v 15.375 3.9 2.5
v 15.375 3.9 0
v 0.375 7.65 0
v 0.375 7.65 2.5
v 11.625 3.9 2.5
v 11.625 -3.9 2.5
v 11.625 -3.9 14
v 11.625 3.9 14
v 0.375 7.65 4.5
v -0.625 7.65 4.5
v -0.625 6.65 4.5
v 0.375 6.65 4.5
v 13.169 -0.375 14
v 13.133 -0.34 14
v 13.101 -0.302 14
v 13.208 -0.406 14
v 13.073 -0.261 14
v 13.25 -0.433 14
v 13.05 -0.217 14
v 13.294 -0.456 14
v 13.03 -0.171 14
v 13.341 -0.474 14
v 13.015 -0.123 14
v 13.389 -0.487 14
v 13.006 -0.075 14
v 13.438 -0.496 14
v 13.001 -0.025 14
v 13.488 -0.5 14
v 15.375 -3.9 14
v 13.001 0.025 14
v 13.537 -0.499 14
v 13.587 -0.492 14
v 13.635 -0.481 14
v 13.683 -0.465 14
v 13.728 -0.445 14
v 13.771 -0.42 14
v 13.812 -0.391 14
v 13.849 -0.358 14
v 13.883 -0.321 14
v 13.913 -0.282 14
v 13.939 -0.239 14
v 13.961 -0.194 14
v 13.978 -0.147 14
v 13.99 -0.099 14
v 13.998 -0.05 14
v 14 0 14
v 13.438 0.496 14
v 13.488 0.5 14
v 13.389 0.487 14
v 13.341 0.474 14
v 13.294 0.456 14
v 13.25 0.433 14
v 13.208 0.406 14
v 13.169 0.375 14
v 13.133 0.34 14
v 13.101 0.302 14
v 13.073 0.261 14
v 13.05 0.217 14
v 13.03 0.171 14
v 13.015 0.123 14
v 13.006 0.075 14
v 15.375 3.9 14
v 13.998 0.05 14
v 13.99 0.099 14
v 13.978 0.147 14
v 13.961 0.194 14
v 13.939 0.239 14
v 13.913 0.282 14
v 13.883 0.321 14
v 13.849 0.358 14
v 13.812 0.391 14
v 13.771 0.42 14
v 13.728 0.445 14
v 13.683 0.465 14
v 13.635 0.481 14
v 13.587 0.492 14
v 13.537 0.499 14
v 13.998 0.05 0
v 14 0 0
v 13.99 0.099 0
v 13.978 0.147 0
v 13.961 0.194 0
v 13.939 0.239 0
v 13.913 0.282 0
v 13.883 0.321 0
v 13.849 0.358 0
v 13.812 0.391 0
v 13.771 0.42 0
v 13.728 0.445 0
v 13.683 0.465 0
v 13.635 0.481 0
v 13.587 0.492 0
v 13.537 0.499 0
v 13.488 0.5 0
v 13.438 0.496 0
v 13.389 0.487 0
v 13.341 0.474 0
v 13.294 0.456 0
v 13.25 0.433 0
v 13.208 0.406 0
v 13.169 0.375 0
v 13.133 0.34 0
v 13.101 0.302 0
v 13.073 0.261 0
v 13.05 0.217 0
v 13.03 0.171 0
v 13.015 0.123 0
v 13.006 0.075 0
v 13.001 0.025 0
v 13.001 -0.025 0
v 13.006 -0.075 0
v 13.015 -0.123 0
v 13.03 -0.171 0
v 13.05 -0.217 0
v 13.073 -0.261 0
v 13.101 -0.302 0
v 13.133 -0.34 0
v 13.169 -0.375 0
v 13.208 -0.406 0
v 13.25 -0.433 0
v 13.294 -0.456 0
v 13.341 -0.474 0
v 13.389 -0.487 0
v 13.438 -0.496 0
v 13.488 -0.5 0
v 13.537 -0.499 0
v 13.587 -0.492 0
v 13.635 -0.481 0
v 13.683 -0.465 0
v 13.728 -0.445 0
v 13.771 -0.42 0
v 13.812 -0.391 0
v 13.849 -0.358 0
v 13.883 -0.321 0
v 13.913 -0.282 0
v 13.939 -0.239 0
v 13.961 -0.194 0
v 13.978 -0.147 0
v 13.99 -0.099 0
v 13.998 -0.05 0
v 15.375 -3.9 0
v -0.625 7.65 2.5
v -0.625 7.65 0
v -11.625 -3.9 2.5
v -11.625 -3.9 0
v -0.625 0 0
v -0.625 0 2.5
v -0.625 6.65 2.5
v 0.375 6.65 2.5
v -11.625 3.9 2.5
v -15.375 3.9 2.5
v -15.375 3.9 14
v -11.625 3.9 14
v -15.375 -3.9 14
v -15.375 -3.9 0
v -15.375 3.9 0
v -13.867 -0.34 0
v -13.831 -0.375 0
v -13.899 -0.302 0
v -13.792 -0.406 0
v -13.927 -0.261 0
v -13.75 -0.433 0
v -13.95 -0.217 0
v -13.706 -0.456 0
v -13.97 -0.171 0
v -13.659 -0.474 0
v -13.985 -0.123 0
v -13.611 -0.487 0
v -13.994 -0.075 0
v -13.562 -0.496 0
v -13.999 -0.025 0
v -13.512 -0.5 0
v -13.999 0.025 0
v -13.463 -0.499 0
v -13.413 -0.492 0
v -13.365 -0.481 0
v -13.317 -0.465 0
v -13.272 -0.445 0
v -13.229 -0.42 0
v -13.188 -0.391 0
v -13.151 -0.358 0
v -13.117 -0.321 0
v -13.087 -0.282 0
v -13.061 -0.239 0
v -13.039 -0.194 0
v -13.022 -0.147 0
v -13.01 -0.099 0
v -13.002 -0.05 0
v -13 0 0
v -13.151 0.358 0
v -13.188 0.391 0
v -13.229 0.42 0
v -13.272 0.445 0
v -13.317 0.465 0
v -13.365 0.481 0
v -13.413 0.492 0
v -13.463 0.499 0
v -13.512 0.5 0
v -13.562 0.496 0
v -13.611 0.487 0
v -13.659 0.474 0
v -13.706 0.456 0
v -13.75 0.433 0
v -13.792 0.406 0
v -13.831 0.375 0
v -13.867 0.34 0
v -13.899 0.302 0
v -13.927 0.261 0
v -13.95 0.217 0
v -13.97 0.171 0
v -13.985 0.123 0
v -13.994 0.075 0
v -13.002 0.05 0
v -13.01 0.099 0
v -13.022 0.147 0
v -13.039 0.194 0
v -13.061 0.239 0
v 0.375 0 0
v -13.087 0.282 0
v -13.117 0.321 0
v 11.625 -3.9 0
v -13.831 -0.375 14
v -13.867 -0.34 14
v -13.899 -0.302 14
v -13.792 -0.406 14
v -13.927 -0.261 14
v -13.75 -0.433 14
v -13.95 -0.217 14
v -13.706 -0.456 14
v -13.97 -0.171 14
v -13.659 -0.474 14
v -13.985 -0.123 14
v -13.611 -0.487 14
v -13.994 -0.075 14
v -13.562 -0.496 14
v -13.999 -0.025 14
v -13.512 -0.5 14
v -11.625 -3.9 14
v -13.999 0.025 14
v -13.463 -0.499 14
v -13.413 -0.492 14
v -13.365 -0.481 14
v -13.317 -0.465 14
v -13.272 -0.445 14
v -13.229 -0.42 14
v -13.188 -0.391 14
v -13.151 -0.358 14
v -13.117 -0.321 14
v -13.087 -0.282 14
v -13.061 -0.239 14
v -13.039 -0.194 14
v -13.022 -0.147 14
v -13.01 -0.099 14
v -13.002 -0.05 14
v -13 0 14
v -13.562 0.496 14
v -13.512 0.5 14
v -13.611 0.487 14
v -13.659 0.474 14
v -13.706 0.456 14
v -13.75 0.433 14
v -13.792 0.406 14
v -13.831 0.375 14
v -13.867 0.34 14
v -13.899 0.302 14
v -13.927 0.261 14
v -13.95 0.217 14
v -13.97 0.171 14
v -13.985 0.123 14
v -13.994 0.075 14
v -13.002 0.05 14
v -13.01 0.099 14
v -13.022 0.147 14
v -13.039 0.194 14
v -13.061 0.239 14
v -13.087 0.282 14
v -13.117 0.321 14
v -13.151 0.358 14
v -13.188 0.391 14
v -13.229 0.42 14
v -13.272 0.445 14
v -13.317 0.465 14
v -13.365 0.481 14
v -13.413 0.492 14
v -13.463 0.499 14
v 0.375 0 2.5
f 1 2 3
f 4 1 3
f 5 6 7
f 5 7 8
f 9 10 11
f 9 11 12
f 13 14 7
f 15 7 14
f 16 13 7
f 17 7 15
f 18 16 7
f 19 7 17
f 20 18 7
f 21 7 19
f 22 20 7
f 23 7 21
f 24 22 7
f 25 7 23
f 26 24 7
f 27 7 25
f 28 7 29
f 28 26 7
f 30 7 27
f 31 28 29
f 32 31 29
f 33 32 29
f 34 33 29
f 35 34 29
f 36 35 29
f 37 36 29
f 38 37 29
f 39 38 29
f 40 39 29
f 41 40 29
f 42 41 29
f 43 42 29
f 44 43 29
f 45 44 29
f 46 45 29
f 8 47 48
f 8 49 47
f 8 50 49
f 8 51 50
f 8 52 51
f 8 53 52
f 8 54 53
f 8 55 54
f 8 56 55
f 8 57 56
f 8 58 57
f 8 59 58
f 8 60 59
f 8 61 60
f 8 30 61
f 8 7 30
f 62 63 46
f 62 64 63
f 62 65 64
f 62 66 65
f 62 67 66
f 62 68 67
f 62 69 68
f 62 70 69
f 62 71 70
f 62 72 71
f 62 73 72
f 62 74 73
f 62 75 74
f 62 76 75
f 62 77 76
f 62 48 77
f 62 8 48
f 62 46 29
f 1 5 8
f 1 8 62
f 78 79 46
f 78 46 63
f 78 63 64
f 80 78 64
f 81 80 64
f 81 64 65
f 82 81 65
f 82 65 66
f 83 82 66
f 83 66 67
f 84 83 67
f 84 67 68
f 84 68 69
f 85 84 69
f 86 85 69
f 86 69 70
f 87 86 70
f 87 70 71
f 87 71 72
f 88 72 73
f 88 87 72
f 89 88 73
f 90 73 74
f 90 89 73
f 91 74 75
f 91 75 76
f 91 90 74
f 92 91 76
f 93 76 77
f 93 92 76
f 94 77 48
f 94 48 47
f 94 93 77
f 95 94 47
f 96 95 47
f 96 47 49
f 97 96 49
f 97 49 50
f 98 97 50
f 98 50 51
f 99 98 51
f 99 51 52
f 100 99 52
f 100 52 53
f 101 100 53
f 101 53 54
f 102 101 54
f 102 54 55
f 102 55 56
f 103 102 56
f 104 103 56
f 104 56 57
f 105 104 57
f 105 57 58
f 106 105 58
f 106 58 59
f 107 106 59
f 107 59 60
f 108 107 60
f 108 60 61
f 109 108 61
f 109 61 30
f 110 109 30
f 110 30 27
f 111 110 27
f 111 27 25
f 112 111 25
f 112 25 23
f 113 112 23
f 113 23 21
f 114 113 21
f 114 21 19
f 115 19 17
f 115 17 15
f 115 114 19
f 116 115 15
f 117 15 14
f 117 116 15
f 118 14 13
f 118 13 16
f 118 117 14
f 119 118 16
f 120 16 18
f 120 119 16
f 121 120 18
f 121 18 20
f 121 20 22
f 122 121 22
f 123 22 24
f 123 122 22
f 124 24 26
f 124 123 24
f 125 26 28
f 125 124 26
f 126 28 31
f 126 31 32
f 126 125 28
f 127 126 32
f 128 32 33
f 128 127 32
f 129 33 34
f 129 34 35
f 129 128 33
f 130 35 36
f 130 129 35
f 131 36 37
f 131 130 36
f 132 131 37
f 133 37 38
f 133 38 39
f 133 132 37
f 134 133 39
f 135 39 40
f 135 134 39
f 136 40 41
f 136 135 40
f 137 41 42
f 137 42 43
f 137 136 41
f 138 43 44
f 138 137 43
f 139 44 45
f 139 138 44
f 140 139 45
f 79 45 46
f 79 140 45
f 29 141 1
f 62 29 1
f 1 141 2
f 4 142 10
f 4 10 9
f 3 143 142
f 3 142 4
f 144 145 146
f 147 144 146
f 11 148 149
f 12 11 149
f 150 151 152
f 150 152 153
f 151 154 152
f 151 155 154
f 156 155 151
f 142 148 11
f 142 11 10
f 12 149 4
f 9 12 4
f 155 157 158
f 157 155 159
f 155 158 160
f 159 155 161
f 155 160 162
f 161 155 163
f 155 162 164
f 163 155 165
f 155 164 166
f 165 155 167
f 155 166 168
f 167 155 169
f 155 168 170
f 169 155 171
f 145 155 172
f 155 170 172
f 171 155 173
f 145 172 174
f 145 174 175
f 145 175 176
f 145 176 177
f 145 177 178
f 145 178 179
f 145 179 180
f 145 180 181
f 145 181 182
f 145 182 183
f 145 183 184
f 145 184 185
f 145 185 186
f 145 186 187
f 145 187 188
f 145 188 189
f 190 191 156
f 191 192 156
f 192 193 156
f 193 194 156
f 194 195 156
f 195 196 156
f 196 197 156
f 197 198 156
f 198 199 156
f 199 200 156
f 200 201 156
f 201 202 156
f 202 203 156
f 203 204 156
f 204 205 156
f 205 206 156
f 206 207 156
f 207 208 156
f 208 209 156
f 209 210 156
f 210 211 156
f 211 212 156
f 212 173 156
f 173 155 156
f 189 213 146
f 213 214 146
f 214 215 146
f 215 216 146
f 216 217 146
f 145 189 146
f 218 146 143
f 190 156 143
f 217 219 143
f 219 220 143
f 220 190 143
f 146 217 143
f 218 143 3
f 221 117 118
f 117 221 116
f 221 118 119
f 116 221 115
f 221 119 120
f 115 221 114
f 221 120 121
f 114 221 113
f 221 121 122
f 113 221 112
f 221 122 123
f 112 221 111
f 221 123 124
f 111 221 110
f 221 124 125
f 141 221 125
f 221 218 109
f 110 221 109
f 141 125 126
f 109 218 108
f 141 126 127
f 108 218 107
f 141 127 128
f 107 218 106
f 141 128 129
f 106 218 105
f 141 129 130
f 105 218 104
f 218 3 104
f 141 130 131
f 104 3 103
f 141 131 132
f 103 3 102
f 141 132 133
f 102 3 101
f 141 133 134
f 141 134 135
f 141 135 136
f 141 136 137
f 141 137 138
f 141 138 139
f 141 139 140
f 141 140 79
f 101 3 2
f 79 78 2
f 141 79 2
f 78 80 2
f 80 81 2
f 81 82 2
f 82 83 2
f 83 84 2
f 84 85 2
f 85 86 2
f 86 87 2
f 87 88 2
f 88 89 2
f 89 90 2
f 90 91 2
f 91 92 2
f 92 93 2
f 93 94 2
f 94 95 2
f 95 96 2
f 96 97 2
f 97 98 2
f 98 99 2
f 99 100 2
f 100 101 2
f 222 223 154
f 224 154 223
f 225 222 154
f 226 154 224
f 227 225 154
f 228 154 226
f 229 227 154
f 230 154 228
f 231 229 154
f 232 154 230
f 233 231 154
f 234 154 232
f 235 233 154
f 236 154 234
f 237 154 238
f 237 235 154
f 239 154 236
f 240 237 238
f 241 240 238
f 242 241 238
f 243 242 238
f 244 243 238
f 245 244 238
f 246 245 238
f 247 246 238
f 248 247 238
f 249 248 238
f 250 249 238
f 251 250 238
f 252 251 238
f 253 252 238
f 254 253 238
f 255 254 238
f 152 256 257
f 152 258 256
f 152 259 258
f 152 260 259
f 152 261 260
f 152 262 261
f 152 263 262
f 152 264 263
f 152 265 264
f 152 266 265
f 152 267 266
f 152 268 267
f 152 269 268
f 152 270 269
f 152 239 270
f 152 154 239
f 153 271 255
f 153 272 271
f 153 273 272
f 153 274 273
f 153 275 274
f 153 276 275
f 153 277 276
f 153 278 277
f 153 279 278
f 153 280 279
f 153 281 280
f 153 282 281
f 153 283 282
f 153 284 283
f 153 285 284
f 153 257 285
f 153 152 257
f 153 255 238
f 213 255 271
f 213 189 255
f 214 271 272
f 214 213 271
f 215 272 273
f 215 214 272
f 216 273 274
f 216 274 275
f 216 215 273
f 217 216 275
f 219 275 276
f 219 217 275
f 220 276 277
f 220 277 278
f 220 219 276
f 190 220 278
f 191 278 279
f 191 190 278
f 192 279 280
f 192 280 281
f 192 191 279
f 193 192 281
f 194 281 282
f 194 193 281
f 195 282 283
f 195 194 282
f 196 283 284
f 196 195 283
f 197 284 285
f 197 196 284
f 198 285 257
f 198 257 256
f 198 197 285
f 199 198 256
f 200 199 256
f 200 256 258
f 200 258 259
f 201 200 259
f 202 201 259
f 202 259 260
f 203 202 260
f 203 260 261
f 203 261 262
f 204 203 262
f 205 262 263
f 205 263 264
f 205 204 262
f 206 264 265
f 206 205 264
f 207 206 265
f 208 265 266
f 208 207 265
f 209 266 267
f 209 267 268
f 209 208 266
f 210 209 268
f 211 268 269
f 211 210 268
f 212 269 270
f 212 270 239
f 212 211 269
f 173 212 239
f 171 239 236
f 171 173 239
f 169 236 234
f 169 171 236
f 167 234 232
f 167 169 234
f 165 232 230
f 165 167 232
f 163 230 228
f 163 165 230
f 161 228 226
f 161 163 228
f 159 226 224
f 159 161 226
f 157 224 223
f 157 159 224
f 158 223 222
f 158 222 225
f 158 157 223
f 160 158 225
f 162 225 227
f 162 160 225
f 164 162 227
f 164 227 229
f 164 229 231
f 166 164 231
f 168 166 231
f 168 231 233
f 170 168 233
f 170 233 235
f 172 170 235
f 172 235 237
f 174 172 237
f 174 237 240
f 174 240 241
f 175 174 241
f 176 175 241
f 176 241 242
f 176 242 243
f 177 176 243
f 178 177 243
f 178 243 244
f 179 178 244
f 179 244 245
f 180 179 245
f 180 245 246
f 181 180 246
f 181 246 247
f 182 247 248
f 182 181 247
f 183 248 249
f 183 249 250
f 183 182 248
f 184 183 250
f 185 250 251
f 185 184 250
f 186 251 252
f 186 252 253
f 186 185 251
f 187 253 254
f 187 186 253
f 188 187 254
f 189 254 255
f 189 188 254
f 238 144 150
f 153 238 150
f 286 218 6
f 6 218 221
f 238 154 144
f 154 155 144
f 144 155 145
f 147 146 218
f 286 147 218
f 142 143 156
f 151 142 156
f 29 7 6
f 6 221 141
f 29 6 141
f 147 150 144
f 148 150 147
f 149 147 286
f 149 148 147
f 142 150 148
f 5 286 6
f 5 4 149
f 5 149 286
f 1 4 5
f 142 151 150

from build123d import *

# Parameters (mm, degrees)
F0_W     = 1
F0_H     = 1
F0_W_2   = 3.75
F0_H_2   = 7.8
F0_R     = 0.5
F1_DEPTH = 2.5
F2_W     = 3.75
F2_H     = 7.8
F2_R     = 0.5
F3_DEPTH = 11.5
F4_W     = 1
F4_H     = 1
F5_DEPTH = 2


with BuildPart() as f1:
    # F0 (on Top) → F1 (new body)
    with BuildSketch(Plane.XY):
        Polygon((-15.375, 3.9), (-11.625, 3.9), (-11.625, -3.9), (-0.625, 0), (0.375, 0), (11.625, -3.9), (11.625, 3.9), (15.375, 3.9), (0.375, 7.65), (0.375, 6.65), (-0.625, 6.65), (-0.625, 7.65), align=None)
        with Locations((-0.125, 7.15)):
            Rectangle(F0_W, F0_H)
        with Locations((-13.5, 0)):
            Rectangle(F0_W_2, F0_H_2)
        with Locations((-13.5, 0)):
            Circle(F0_R, mode=Mode.SUBTRACT)
        with Locations((13.5, 0)):
            Rectangle(F0_W_2, F0_H_2)
        with Locations((13.5, 0)):
            Circle(F0_R, mode=Mode.SUBTRACT)
    extrude(amount=F1_DEPTH)

    # F2 (on face) → F3 (join)
    with BuildSketch(Plane.XY.offset(2.5)):
        with Locations((-13.5, 0)):
            Rectangle(F2_W, F2_H)
        with Locations((-13.5, 0)):
            Circle(F2_R, mode=Mode.SUBTRACT)
        with Locations((13.5, 0)):
            Rectangle(F2_W, F2_H)
        with Locations((13.5, 0)):
            Circle(F2_R, mode=Mode.SUBTRACT)
    extrude(amount=F3_DEPTH)

    # F4 (on face) → F5 (join)
    with BuildSketch(Plane.XY.offset(2.5)):
        with Locations((-0.125, 7.15)):
            Rectangle(F4_W, F4_H)
    extrude(amount=F5_DEPTH)


solid = f1.part
